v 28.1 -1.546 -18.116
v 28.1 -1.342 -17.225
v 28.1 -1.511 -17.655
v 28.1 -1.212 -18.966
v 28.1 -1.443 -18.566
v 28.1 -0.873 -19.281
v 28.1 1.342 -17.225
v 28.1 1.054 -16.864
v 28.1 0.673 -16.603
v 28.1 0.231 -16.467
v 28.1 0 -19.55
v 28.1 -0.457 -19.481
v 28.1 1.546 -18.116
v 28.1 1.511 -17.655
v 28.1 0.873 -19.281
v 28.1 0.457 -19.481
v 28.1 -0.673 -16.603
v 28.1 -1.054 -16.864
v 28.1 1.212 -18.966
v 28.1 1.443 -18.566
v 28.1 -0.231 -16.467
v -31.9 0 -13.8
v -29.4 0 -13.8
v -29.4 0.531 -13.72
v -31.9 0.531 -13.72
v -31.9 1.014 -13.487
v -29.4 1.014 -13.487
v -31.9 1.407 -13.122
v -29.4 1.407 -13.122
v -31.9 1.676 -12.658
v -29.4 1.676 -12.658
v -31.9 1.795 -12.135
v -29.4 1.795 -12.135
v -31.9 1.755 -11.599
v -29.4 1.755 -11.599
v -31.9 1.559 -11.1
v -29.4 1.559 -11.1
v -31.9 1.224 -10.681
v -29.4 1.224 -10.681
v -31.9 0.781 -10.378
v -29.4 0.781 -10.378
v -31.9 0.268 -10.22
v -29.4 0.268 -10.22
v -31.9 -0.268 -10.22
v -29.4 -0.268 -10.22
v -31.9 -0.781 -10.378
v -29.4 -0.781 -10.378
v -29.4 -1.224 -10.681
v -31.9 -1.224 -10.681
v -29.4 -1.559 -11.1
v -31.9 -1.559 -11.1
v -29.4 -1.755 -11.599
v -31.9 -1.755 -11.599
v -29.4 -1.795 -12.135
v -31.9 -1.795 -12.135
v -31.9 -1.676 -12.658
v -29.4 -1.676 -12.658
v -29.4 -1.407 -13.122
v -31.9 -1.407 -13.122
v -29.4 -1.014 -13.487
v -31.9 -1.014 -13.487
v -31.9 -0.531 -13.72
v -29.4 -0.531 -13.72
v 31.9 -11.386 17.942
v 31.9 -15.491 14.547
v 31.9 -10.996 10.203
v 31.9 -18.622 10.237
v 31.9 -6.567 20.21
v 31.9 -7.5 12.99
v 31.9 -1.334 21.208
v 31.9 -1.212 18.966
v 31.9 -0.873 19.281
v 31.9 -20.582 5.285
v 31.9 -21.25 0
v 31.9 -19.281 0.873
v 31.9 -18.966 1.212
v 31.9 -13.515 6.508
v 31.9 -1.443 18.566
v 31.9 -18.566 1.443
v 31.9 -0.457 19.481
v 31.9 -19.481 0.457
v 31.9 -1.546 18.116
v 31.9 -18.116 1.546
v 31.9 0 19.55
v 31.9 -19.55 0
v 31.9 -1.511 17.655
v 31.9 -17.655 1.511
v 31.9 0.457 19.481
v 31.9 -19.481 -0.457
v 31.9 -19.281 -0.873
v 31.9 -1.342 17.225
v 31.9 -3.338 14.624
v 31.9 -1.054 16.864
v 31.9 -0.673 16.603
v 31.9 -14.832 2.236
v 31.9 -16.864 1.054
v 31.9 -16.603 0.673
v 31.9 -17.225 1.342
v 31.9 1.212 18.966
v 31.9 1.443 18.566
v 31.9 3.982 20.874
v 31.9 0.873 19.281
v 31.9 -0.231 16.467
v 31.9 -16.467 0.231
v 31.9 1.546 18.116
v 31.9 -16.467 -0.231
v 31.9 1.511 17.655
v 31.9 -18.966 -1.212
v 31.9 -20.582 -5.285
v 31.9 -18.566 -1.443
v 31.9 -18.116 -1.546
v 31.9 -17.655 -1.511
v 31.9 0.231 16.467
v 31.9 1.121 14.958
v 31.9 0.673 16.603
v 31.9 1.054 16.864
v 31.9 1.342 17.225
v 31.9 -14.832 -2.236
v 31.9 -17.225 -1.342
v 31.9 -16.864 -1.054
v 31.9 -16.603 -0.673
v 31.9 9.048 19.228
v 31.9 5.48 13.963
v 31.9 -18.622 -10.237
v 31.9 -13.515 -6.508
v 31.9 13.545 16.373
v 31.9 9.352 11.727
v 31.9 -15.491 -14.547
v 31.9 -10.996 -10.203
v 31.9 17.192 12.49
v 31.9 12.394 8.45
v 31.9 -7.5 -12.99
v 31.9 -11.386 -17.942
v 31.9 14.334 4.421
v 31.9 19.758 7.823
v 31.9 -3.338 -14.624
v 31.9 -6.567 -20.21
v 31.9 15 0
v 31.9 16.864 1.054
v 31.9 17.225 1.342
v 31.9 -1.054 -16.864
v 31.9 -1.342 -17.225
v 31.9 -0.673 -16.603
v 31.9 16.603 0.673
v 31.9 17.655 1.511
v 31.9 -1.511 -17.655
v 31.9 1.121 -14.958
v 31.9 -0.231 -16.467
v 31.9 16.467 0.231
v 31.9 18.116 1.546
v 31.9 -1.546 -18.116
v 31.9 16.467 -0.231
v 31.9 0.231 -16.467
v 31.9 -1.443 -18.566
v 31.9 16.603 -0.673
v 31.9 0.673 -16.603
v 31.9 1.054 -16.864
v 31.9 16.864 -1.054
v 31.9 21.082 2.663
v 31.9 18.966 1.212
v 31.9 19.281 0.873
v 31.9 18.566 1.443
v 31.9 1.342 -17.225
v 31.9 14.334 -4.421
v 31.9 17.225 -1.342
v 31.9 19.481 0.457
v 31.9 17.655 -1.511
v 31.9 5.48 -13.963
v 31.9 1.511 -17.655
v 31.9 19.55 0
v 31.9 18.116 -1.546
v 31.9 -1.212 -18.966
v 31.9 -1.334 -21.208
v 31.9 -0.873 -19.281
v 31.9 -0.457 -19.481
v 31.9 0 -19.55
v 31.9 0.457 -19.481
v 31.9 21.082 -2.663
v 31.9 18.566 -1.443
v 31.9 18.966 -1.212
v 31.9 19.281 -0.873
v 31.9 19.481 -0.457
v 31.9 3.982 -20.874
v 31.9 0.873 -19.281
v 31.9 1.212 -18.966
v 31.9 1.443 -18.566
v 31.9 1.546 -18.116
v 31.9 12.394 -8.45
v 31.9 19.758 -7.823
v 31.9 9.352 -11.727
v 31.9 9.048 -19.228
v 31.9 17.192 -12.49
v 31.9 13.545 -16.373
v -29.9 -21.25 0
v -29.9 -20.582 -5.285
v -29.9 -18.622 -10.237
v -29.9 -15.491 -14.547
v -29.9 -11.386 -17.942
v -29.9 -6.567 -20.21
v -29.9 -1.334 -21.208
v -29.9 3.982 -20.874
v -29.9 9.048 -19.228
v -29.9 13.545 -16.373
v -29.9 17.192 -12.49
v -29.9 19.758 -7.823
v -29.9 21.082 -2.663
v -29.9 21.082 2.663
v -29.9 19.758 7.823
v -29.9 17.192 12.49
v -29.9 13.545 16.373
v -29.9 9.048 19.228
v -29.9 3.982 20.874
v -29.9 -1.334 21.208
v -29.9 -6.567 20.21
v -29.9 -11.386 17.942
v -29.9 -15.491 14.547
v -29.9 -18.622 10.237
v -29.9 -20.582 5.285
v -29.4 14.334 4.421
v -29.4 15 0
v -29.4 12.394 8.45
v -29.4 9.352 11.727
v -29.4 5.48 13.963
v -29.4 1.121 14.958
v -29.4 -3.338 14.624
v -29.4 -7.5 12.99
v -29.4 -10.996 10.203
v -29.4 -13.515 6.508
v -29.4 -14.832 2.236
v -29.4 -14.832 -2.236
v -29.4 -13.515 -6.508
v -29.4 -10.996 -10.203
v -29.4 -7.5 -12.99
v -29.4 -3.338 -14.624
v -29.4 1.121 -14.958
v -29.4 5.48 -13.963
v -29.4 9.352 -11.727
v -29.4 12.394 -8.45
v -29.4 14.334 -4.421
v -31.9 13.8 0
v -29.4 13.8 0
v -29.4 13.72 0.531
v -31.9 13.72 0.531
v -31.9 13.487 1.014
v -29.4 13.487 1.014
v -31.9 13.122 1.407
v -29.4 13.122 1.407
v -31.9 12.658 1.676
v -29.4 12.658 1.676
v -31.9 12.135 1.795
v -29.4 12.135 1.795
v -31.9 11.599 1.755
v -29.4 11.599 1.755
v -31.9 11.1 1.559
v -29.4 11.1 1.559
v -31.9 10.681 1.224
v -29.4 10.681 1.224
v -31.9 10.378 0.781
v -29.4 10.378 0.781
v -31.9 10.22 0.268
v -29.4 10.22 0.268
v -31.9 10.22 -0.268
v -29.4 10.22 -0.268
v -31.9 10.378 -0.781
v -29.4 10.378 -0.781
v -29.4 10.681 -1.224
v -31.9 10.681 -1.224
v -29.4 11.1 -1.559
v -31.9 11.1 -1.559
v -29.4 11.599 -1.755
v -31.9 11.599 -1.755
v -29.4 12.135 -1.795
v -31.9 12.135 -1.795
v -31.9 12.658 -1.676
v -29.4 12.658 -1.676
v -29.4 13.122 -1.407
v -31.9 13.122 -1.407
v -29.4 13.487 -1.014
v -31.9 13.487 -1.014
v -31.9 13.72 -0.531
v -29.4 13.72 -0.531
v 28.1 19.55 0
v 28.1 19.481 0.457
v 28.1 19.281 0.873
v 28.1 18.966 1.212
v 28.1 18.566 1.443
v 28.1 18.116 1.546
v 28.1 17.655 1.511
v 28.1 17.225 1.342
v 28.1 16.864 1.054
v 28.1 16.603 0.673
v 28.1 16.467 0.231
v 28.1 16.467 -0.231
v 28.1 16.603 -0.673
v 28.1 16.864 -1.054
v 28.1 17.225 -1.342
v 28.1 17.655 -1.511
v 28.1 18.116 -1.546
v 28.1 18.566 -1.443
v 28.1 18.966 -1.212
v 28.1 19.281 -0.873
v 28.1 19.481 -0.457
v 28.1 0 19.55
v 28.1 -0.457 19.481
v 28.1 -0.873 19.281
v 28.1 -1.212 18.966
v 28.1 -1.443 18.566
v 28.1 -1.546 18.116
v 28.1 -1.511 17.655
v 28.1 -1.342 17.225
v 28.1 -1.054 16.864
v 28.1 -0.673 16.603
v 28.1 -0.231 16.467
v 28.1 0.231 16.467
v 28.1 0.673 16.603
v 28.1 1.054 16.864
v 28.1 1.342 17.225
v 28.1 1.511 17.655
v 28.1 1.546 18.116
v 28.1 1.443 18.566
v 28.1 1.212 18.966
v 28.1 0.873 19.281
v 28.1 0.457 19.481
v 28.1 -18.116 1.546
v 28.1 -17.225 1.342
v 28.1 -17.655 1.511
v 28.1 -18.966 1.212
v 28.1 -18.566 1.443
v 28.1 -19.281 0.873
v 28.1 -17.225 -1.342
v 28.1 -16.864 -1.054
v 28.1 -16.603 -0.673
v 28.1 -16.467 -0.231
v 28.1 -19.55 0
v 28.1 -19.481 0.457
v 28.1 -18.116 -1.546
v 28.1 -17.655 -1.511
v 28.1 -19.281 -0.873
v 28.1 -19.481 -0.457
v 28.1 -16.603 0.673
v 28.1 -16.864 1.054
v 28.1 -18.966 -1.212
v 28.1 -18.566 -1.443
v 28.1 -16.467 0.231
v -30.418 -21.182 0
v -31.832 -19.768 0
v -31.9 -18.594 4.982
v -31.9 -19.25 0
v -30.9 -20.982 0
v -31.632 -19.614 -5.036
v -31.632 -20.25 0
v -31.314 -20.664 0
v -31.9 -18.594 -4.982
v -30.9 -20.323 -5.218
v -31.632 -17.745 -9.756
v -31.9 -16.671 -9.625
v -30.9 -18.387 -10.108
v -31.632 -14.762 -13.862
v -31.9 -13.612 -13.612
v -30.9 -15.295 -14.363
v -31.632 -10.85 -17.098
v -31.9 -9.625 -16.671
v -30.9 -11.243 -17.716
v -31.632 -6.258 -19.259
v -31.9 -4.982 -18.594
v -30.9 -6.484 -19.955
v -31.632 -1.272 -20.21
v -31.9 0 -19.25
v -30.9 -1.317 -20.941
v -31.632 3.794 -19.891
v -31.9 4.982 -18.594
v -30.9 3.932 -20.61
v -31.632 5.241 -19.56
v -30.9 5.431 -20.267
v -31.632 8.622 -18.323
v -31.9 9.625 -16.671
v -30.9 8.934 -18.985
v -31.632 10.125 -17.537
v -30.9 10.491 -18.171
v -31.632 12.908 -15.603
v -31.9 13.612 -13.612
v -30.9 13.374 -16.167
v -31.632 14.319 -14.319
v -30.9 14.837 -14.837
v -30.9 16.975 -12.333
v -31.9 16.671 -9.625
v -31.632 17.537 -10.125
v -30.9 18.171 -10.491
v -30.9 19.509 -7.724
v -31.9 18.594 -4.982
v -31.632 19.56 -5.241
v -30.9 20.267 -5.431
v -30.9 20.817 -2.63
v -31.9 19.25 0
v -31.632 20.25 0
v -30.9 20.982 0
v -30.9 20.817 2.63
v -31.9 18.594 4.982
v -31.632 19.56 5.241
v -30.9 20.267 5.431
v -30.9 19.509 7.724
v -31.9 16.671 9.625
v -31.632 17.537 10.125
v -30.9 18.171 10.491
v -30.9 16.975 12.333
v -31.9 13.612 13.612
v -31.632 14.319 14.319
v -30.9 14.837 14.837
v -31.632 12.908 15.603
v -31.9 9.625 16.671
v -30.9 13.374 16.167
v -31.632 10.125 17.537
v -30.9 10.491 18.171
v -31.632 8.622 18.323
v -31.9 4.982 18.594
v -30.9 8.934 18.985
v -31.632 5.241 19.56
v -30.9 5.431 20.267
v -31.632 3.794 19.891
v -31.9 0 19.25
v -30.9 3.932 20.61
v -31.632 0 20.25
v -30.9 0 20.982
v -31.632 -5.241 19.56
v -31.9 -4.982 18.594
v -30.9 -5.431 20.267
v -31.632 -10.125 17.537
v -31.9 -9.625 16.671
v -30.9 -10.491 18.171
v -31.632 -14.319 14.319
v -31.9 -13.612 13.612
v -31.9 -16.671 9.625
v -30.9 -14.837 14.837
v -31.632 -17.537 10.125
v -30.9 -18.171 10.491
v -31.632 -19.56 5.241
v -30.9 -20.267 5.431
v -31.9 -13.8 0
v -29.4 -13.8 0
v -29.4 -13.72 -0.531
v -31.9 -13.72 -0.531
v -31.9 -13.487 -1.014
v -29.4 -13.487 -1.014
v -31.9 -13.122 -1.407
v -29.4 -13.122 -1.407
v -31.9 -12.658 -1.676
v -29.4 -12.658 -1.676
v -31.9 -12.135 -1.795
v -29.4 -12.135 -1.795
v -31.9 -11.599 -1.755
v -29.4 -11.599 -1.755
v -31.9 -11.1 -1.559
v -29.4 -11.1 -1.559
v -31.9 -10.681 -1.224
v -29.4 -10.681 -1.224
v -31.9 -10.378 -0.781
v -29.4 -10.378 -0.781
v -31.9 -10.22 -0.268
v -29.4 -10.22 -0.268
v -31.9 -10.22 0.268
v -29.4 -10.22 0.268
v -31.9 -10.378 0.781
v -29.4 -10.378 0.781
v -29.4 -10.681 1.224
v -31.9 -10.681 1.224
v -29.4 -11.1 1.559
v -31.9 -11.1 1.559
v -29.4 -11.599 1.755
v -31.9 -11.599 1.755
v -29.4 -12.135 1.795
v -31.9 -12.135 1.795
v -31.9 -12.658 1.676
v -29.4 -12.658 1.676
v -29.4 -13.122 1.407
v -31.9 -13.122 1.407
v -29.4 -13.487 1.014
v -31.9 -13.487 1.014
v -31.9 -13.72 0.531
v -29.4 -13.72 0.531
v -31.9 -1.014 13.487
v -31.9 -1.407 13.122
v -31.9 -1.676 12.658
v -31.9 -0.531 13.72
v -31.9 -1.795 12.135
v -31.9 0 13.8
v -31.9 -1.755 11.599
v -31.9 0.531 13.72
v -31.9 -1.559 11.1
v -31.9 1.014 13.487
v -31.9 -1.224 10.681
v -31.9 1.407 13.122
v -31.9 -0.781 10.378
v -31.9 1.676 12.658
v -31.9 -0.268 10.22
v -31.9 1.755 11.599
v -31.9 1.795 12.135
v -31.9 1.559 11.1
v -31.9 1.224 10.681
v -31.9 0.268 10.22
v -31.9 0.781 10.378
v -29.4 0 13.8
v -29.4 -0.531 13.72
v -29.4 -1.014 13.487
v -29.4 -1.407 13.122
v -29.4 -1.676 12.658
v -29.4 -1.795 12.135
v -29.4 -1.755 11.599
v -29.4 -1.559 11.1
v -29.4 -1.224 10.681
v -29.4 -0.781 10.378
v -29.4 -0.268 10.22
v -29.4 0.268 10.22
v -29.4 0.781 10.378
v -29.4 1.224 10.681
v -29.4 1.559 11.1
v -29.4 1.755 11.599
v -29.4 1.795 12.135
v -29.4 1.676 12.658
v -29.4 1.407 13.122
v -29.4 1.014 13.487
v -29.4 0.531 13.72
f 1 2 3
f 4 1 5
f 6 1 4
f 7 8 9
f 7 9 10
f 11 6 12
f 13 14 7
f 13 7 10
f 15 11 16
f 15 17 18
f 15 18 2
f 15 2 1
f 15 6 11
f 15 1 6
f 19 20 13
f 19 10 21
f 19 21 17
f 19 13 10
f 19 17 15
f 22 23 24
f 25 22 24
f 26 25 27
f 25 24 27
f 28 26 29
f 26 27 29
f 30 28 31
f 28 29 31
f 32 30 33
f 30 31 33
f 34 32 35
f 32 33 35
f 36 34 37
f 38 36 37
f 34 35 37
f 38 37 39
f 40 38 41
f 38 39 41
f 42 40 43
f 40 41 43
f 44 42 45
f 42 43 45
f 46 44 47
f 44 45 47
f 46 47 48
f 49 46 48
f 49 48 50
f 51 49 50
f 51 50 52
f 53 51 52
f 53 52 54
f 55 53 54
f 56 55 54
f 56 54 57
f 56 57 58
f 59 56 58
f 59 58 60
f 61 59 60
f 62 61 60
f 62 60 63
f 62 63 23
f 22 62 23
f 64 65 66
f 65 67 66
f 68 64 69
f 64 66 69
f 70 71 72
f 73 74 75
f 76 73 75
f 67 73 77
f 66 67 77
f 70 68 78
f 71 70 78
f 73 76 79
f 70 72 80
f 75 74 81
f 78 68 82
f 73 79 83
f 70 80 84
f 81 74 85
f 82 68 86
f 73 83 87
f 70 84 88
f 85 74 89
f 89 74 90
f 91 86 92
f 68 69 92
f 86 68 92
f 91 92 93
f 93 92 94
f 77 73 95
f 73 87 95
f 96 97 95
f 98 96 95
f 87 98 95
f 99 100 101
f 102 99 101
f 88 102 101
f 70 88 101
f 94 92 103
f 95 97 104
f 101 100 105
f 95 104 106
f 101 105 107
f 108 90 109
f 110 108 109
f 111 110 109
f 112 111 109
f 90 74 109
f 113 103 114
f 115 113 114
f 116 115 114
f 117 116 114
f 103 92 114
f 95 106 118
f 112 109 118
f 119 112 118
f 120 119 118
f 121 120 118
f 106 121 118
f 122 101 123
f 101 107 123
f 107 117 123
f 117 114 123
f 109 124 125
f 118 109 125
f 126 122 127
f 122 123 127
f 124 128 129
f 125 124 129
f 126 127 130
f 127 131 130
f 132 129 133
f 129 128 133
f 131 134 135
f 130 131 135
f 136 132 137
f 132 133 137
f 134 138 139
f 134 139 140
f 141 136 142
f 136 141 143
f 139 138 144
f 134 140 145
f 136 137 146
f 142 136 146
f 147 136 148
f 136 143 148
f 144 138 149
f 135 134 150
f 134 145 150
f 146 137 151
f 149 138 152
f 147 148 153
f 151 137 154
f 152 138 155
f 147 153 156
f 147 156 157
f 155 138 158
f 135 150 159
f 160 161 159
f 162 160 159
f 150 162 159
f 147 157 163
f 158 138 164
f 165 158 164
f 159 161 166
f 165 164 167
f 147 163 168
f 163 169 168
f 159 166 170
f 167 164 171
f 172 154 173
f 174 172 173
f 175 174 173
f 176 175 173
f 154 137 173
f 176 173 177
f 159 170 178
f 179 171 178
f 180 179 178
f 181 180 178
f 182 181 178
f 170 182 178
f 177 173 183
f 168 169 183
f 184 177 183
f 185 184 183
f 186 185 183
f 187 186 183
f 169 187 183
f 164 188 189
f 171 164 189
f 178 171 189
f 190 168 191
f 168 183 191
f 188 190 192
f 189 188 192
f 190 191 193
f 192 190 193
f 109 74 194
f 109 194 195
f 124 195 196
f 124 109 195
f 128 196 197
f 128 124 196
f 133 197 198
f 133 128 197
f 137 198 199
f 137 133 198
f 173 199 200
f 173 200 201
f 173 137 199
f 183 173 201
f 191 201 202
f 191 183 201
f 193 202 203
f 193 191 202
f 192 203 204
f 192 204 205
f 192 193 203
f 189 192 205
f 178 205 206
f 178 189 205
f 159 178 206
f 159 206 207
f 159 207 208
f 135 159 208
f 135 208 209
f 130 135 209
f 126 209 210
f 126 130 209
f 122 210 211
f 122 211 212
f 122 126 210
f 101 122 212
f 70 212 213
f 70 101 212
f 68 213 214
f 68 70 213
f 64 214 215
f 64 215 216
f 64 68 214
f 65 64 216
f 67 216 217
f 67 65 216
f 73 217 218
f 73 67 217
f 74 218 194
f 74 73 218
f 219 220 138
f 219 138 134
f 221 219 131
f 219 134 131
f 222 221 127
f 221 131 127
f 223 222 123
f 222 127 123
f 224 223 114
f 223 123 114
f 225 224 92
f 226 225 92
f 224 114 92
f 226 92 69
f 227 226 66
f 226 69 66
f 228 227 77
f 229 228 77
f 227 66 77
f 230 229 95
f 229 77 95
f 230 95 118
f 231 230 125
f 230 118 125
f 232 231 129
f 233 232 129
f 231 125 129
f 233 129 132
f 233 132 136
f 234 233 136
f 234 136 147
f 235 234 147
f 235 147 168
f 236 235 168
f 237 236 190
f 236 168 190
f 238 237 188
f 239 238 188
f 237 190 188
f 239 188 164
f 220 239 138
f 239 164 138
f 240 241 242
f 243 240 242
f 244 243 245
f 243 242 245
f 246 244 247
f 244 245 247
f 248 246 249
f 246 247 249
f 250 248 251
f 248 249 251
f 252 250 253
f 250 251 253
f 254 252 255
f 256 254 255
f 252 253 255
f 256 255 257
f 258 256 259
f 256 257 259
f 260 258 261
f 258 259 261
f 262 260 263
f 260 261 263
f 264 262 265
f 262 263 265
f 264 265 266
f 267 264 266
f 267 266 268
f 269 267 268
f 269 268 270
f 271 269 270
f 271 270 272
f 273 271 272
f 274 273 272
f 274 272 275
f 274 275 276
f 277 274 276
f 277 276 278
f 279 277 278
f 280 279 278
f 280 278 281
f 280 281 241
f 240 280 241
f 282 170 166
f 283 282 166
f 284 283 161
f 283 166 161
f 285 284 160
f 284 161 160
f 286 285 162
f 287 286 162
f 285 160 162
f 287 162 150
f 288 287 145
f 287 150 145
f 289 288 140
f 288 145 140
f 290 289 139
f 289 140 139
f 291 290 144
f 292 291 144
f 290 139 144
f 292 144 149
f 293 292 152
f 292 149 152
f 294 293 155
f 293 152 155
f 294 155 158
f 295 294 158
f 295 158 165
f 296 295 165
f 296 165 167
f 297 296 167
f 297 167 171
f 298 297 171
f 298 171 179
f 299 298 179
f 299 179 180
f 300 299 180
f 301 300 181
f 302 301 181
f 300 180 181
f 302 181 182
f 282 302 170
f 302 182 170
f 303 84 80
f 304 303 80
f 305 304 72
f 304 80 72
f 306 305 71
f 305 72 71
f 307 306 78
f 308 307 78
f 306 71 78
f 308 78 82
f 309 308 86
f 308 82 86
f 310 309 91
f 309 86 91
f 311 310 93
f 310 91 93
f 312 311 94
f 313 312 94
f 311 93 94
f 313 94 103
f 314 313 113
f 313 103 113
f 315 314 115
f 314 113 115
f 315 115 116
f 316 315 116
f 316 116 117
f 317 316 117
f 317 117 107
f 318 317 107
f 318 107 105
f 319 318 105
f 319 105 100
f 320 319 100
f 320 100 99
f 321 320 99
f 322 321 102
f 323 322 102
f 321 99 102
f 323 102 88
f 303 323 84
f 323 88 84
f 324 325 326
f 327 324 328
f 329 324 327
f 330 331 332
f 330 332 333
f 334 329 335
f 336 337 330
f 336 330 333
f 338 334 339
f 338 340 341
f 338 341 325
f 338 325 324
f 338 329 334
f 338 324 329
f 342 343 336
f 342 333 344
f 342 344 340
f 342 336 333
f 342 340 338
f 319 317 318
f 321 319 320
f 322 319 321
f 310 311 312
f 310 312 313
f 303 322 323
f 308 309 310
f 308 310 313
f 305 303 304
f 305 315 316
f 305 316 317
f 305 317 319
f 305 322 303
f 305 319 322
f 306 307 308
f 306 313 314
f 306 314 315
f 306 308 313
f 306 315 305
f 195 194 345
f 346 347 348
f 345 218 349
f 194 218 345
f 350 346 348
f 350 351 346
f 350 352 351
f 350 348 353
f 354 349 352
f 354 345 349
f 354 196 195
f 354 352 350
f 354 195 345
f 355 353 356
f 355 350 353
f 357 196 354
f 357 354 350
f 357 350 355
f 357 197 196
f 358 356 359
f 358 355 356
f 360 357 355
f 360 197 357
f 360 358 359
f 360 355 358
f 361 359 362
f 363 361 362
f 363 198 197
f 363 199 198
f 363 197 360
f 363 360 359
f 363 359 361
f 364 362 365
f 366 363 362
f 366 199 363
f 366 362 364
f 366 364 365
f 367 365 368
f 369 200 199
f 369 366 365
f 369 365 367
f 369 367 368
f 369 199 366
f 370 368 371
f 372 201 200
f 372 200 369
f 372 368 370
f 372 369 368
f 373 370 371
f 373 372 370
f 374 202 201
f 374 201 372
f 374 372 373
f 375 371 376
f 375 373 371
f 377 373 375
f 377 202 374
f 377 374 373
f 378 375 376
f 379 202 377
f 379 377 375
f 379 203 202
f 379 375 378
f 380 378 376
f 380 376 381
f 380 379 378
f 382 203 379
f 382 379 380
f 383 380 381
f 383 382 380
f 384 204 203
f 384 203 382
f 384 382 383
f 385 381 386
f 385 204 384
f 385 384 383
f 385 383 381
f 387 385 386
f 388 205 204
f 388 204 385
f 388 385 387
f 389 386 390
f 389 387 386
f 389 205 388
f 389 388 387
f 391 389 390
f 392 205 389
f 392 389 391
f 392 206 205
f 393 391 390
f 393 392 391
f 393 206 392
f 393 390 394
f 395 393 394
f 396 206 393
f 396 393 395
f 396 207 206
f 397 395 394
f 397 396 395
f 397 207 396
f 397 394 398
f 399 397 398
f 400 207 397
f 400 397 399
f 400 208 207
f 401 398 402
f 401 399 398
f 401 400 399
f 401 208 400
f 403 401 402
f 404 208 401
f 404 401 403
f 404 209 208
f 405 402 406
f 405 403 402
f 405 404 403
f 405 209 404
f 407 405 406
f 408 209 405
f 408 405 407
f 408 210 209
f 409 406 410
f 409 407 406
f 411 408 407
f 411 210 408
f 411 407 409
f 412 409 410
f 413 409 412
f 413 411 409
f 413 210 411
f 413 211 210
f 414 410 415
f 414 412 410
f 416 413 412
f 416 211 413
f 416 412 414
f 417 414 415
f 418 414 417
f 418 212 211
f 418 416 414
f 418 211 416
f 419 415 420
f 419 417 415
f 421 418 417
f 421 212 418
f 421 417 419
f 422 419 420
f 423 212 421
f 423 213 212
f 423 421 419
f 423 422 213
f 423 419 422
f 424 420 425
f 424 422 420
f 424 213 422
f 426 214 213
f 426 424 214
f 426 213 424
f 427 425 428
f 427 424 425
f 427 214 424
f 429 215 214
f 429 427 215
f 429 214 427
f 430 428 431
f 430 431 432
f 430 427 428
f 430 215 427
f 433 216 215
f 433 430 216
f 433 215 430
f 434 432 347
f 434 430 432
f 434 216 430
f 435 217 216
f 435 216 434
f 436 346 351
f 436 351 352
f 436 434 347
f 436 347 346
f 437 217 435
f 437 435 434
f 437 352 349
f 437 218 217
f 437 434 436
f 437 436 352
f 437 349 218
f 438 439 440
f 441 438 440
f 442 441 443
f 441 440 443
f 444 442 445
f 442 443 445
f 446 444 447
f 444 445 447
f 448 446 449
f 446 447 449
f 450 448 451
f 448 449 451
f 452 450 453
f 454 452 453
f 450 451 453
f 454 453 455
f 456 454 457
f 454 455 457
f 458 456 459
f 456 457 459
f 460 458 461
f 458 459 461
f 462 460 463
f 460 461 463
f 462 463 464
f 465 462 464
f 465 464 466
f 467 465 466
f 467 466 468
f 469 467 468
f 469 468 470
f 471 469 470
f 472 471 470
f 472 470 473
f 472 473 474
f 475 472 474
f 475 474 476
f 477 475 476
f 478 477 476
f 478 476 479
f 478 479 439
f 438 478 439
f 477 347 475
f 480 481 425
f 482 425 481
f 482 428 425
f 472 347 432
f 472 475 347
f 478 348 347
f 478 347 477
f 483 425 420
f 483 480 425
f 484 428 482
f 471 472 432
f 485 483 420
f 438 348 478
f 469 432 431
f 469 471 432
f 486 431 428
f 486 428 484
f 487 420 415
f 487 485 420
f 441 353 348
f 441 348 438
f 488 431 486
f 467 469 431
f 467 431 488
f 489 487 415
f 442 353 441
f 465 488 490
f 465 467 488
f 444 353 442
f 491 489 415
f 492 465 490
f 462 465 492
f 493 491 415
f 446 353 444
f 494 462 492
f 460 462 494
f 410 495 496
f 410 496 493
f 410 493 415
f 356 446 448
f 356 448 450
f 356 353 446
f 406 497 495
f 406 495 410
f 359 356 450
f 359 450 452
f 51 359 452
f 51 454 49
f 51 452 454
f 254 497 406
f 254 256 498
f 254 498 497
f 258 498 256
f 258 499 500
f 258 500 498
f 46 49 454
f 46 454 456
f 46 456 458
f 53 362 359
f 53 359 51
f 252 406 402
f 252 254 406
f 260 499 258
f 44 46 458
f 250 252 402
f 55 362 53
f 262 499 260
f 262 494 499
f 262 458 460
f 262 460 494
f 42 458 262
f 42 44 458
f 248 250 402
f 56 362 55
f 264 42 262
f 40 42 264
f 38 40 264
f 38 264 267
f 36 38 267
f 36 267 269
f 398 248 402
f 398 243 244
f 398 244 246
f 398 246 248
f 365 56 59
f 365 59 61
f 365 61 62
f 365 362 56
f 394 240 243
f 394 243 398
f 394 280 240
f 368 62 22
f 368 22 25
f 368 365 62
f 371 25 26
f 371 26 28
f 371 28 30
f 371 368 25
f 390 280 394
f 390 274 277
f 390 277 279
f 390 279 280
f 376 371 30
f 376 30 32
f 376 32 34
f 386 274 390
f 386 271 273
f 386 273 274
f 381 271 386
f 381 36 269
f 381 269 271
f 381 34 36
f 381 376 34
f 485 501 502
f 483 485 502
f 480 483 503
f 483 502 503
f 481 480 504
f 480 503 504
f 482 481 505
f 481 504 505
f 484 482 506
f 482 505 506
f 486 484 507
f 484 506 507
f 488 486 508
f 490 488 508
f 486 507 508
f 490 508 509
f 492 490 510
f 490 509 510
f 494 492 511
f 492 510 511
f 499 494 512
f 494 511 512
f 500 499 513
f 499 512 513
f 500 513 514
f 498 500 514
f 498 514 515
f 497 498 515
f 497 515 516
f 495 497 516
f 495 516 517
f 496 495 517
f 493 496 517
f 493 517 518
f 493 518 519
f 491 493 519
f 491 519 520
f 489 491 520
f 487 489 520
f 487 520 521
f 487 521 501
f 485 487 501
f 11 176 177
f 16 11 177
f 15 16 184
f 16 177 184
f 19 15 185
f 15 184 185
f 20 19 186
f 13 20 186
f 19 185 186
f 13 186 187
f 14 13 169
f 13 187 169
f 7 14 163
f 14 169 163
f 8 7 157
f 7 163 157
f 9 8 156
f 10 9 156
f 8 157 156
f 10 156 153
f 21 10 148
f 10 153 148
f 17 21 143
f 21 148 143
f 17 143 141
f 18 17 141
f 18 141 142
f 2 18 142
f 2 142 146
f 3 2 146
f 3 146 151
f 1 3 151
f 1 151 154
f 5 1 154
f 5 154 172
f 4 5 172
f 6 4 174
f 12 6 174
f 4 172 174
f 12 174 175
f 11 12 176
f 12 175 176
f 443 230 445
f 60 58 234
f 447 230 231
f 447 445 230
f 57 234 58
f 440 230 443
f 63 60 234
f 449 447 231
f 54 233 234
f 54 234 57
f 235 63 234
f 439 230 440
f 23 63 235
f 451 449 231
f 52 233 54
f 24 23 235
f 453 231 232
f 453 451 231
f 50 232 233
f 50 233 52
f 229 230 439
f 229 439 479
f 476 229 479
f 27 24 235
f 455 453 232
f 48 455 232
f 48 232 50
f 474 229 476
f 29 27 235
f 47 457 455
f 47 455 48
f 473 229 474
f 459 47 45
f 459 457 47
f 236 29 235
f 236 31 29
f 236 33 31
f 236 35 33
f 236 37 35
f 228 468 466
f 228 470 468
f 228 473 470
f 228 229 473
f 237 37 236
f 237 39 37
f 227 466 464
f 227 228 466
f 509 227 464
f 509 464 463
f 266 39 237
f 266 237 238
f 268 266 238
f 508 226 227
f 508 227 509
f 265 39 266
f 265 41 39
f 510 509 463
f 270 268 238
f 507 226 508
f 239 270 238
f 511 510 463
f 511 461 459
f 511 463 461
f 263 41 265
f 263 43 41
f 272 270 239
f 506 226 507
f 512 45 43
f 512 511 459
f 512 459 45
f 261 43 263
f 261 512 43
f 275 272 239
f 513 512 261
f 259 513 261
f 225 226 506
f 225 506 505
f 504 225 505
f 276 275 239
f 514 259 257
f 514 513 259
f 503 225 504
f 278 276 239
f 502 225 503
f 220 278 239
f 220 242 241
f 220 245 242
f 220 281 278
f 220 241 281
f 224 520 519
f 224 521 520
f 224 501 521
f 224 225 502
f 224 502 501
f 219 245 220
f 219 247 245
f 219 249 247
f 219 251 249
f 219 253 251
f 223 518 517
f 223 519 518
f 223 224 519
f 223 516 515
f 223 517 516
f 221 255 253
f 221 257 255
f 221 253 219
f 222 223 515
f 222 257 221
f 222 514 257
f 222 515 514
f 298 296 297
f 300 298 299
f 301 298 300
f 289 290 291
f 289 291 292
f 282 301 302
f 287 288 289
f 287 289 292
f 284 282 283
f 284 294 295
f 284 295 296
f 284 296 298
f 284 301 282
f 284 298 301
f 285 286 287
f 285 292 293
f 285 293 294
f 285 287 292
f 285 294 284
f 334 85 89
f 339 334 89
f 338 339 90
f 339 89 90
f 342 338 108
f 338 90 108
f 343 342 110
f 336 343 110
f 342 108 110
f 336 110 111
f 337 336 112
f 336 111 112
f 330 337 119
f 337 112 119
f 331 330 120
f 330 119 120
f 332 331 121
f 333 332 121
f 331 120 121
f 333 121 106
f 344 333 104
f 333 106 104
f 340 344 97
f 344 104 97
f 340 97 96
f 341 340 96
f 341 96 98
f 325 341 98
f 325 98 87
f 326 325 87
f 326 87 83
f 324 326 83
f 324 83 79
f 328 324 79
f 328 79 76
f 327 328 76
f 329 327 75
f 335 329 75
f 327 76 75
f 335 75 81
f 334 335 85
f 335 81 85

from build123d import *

# Parameters (mm, degrees)
SKETCH1_W          = 63.8
SKETCH1_H          = 21.25
SKETCH2_R          = 15
CUT_EXTRUDE1_DEPTH = 61.3
SKETCH3_R          = 1.55
CUT_EXTRUDE2_DEPTH = 3.8
CIRPATTERN1_COUNT  = 4
CUT_EXTRUDE3_REACH = 70.27
SKETCH4_R          = 1.8
CIRPATTERN2_COUNT  = 4
FILLET1_R          = 2


with BuildPart() as part:
    # Sketch1 → Revolve1 (revolve)
    with BuildSketch(Plane.XY):
        with Locations((0, 10.625)):
            Rectangle(SKETCH1_W, SKETCH1_H)
    revolve(axis=Axis((-31.9, 0, 0), (1, 0, 0)))

    # Sketch2 → Cut-Extrude1 (cut)
    with BuildSketch(Plane(origin=(31.9, 0, 0), x_dir=(0, 0, -1), z_dir=(1, 0, 0))):
        Circle(SKETCH2_R)
    extrude(amount=-CUT_EXTRUDE1_DEPTH, mode=Mode.SUBTRACT)

    # Sketch3 → Cut-Extrude2 (cut)
    with BuildSketch(Plane(origin=(31.9, 0, 0), x_dir=(0, 0, -1), z_dir=(1, 0, 0))):
        with Locations((0, 18)):
            Circle(SKETCH3_R)
    cut_extrude2 = extrude(amount=-CUT_EXTRUDE2_DEPTH, mode=Mode.SUBTRACT)

    # CirPattern1: Cut-Extrude2 ×4 about axis
    cirpattern1_axis = Axis((31.9, 0, 0), (-1, 0, 0))
    for i in range(1, CIRPATTERN1_COUNT):
        add(cut_extrude2.rotate(cirpattern1_axis, i * 360 / CIRPATTERN1_COUNT), mode=Mode.SUBTRACT)

    # Sketch4 → Cut-Extrude3 (cut, up to next)
    with BuildSketch(Plane(origin=(-29.4, 0, 0), x_dir=(0, 0, -1), z_dir=(1, 0, 0)), mode=Mode.PRIVATE) as cut_extrude3_sk1:
        with Locations((0, 12)):
            Circle(SKETCH4_R)
    cut_extrude3_tool1 = extrude(cut_extrude3_sk1.sketch, amount=-CUT_EXTRUDE3_REACH, mode=Mode.PRIVATE) & part.part
    cut_extrude3 = cut_extrude3_tool1.solids().sort_by_distance((-29.4, 12, 0))[0]
    add(cut_extrude3, mode=Mode.SUBTRACT)

    # CirPattern2: Cut-Extrude3 ×4 about axis
    cirpattern2_axis = Axis((-29.4, 0, 0), (1, 0, 0))
    for i in range(1, CIRPATTERN2_COUNT):
        add(cut_extrude3.rotate(cirpattern2_axis, i * 360 / CIRPATTERN2_COUNT), mode=Mode.SUBTRACT)

    # Fillet1
    fillet1_edges = [part.edges().sort_by_distance(p)[0] for p in [
        (-31.9, -21.25, 0),
    ]]
    fillet(fillet1_edges, radius=FILLET1_R)


solid = part.part
